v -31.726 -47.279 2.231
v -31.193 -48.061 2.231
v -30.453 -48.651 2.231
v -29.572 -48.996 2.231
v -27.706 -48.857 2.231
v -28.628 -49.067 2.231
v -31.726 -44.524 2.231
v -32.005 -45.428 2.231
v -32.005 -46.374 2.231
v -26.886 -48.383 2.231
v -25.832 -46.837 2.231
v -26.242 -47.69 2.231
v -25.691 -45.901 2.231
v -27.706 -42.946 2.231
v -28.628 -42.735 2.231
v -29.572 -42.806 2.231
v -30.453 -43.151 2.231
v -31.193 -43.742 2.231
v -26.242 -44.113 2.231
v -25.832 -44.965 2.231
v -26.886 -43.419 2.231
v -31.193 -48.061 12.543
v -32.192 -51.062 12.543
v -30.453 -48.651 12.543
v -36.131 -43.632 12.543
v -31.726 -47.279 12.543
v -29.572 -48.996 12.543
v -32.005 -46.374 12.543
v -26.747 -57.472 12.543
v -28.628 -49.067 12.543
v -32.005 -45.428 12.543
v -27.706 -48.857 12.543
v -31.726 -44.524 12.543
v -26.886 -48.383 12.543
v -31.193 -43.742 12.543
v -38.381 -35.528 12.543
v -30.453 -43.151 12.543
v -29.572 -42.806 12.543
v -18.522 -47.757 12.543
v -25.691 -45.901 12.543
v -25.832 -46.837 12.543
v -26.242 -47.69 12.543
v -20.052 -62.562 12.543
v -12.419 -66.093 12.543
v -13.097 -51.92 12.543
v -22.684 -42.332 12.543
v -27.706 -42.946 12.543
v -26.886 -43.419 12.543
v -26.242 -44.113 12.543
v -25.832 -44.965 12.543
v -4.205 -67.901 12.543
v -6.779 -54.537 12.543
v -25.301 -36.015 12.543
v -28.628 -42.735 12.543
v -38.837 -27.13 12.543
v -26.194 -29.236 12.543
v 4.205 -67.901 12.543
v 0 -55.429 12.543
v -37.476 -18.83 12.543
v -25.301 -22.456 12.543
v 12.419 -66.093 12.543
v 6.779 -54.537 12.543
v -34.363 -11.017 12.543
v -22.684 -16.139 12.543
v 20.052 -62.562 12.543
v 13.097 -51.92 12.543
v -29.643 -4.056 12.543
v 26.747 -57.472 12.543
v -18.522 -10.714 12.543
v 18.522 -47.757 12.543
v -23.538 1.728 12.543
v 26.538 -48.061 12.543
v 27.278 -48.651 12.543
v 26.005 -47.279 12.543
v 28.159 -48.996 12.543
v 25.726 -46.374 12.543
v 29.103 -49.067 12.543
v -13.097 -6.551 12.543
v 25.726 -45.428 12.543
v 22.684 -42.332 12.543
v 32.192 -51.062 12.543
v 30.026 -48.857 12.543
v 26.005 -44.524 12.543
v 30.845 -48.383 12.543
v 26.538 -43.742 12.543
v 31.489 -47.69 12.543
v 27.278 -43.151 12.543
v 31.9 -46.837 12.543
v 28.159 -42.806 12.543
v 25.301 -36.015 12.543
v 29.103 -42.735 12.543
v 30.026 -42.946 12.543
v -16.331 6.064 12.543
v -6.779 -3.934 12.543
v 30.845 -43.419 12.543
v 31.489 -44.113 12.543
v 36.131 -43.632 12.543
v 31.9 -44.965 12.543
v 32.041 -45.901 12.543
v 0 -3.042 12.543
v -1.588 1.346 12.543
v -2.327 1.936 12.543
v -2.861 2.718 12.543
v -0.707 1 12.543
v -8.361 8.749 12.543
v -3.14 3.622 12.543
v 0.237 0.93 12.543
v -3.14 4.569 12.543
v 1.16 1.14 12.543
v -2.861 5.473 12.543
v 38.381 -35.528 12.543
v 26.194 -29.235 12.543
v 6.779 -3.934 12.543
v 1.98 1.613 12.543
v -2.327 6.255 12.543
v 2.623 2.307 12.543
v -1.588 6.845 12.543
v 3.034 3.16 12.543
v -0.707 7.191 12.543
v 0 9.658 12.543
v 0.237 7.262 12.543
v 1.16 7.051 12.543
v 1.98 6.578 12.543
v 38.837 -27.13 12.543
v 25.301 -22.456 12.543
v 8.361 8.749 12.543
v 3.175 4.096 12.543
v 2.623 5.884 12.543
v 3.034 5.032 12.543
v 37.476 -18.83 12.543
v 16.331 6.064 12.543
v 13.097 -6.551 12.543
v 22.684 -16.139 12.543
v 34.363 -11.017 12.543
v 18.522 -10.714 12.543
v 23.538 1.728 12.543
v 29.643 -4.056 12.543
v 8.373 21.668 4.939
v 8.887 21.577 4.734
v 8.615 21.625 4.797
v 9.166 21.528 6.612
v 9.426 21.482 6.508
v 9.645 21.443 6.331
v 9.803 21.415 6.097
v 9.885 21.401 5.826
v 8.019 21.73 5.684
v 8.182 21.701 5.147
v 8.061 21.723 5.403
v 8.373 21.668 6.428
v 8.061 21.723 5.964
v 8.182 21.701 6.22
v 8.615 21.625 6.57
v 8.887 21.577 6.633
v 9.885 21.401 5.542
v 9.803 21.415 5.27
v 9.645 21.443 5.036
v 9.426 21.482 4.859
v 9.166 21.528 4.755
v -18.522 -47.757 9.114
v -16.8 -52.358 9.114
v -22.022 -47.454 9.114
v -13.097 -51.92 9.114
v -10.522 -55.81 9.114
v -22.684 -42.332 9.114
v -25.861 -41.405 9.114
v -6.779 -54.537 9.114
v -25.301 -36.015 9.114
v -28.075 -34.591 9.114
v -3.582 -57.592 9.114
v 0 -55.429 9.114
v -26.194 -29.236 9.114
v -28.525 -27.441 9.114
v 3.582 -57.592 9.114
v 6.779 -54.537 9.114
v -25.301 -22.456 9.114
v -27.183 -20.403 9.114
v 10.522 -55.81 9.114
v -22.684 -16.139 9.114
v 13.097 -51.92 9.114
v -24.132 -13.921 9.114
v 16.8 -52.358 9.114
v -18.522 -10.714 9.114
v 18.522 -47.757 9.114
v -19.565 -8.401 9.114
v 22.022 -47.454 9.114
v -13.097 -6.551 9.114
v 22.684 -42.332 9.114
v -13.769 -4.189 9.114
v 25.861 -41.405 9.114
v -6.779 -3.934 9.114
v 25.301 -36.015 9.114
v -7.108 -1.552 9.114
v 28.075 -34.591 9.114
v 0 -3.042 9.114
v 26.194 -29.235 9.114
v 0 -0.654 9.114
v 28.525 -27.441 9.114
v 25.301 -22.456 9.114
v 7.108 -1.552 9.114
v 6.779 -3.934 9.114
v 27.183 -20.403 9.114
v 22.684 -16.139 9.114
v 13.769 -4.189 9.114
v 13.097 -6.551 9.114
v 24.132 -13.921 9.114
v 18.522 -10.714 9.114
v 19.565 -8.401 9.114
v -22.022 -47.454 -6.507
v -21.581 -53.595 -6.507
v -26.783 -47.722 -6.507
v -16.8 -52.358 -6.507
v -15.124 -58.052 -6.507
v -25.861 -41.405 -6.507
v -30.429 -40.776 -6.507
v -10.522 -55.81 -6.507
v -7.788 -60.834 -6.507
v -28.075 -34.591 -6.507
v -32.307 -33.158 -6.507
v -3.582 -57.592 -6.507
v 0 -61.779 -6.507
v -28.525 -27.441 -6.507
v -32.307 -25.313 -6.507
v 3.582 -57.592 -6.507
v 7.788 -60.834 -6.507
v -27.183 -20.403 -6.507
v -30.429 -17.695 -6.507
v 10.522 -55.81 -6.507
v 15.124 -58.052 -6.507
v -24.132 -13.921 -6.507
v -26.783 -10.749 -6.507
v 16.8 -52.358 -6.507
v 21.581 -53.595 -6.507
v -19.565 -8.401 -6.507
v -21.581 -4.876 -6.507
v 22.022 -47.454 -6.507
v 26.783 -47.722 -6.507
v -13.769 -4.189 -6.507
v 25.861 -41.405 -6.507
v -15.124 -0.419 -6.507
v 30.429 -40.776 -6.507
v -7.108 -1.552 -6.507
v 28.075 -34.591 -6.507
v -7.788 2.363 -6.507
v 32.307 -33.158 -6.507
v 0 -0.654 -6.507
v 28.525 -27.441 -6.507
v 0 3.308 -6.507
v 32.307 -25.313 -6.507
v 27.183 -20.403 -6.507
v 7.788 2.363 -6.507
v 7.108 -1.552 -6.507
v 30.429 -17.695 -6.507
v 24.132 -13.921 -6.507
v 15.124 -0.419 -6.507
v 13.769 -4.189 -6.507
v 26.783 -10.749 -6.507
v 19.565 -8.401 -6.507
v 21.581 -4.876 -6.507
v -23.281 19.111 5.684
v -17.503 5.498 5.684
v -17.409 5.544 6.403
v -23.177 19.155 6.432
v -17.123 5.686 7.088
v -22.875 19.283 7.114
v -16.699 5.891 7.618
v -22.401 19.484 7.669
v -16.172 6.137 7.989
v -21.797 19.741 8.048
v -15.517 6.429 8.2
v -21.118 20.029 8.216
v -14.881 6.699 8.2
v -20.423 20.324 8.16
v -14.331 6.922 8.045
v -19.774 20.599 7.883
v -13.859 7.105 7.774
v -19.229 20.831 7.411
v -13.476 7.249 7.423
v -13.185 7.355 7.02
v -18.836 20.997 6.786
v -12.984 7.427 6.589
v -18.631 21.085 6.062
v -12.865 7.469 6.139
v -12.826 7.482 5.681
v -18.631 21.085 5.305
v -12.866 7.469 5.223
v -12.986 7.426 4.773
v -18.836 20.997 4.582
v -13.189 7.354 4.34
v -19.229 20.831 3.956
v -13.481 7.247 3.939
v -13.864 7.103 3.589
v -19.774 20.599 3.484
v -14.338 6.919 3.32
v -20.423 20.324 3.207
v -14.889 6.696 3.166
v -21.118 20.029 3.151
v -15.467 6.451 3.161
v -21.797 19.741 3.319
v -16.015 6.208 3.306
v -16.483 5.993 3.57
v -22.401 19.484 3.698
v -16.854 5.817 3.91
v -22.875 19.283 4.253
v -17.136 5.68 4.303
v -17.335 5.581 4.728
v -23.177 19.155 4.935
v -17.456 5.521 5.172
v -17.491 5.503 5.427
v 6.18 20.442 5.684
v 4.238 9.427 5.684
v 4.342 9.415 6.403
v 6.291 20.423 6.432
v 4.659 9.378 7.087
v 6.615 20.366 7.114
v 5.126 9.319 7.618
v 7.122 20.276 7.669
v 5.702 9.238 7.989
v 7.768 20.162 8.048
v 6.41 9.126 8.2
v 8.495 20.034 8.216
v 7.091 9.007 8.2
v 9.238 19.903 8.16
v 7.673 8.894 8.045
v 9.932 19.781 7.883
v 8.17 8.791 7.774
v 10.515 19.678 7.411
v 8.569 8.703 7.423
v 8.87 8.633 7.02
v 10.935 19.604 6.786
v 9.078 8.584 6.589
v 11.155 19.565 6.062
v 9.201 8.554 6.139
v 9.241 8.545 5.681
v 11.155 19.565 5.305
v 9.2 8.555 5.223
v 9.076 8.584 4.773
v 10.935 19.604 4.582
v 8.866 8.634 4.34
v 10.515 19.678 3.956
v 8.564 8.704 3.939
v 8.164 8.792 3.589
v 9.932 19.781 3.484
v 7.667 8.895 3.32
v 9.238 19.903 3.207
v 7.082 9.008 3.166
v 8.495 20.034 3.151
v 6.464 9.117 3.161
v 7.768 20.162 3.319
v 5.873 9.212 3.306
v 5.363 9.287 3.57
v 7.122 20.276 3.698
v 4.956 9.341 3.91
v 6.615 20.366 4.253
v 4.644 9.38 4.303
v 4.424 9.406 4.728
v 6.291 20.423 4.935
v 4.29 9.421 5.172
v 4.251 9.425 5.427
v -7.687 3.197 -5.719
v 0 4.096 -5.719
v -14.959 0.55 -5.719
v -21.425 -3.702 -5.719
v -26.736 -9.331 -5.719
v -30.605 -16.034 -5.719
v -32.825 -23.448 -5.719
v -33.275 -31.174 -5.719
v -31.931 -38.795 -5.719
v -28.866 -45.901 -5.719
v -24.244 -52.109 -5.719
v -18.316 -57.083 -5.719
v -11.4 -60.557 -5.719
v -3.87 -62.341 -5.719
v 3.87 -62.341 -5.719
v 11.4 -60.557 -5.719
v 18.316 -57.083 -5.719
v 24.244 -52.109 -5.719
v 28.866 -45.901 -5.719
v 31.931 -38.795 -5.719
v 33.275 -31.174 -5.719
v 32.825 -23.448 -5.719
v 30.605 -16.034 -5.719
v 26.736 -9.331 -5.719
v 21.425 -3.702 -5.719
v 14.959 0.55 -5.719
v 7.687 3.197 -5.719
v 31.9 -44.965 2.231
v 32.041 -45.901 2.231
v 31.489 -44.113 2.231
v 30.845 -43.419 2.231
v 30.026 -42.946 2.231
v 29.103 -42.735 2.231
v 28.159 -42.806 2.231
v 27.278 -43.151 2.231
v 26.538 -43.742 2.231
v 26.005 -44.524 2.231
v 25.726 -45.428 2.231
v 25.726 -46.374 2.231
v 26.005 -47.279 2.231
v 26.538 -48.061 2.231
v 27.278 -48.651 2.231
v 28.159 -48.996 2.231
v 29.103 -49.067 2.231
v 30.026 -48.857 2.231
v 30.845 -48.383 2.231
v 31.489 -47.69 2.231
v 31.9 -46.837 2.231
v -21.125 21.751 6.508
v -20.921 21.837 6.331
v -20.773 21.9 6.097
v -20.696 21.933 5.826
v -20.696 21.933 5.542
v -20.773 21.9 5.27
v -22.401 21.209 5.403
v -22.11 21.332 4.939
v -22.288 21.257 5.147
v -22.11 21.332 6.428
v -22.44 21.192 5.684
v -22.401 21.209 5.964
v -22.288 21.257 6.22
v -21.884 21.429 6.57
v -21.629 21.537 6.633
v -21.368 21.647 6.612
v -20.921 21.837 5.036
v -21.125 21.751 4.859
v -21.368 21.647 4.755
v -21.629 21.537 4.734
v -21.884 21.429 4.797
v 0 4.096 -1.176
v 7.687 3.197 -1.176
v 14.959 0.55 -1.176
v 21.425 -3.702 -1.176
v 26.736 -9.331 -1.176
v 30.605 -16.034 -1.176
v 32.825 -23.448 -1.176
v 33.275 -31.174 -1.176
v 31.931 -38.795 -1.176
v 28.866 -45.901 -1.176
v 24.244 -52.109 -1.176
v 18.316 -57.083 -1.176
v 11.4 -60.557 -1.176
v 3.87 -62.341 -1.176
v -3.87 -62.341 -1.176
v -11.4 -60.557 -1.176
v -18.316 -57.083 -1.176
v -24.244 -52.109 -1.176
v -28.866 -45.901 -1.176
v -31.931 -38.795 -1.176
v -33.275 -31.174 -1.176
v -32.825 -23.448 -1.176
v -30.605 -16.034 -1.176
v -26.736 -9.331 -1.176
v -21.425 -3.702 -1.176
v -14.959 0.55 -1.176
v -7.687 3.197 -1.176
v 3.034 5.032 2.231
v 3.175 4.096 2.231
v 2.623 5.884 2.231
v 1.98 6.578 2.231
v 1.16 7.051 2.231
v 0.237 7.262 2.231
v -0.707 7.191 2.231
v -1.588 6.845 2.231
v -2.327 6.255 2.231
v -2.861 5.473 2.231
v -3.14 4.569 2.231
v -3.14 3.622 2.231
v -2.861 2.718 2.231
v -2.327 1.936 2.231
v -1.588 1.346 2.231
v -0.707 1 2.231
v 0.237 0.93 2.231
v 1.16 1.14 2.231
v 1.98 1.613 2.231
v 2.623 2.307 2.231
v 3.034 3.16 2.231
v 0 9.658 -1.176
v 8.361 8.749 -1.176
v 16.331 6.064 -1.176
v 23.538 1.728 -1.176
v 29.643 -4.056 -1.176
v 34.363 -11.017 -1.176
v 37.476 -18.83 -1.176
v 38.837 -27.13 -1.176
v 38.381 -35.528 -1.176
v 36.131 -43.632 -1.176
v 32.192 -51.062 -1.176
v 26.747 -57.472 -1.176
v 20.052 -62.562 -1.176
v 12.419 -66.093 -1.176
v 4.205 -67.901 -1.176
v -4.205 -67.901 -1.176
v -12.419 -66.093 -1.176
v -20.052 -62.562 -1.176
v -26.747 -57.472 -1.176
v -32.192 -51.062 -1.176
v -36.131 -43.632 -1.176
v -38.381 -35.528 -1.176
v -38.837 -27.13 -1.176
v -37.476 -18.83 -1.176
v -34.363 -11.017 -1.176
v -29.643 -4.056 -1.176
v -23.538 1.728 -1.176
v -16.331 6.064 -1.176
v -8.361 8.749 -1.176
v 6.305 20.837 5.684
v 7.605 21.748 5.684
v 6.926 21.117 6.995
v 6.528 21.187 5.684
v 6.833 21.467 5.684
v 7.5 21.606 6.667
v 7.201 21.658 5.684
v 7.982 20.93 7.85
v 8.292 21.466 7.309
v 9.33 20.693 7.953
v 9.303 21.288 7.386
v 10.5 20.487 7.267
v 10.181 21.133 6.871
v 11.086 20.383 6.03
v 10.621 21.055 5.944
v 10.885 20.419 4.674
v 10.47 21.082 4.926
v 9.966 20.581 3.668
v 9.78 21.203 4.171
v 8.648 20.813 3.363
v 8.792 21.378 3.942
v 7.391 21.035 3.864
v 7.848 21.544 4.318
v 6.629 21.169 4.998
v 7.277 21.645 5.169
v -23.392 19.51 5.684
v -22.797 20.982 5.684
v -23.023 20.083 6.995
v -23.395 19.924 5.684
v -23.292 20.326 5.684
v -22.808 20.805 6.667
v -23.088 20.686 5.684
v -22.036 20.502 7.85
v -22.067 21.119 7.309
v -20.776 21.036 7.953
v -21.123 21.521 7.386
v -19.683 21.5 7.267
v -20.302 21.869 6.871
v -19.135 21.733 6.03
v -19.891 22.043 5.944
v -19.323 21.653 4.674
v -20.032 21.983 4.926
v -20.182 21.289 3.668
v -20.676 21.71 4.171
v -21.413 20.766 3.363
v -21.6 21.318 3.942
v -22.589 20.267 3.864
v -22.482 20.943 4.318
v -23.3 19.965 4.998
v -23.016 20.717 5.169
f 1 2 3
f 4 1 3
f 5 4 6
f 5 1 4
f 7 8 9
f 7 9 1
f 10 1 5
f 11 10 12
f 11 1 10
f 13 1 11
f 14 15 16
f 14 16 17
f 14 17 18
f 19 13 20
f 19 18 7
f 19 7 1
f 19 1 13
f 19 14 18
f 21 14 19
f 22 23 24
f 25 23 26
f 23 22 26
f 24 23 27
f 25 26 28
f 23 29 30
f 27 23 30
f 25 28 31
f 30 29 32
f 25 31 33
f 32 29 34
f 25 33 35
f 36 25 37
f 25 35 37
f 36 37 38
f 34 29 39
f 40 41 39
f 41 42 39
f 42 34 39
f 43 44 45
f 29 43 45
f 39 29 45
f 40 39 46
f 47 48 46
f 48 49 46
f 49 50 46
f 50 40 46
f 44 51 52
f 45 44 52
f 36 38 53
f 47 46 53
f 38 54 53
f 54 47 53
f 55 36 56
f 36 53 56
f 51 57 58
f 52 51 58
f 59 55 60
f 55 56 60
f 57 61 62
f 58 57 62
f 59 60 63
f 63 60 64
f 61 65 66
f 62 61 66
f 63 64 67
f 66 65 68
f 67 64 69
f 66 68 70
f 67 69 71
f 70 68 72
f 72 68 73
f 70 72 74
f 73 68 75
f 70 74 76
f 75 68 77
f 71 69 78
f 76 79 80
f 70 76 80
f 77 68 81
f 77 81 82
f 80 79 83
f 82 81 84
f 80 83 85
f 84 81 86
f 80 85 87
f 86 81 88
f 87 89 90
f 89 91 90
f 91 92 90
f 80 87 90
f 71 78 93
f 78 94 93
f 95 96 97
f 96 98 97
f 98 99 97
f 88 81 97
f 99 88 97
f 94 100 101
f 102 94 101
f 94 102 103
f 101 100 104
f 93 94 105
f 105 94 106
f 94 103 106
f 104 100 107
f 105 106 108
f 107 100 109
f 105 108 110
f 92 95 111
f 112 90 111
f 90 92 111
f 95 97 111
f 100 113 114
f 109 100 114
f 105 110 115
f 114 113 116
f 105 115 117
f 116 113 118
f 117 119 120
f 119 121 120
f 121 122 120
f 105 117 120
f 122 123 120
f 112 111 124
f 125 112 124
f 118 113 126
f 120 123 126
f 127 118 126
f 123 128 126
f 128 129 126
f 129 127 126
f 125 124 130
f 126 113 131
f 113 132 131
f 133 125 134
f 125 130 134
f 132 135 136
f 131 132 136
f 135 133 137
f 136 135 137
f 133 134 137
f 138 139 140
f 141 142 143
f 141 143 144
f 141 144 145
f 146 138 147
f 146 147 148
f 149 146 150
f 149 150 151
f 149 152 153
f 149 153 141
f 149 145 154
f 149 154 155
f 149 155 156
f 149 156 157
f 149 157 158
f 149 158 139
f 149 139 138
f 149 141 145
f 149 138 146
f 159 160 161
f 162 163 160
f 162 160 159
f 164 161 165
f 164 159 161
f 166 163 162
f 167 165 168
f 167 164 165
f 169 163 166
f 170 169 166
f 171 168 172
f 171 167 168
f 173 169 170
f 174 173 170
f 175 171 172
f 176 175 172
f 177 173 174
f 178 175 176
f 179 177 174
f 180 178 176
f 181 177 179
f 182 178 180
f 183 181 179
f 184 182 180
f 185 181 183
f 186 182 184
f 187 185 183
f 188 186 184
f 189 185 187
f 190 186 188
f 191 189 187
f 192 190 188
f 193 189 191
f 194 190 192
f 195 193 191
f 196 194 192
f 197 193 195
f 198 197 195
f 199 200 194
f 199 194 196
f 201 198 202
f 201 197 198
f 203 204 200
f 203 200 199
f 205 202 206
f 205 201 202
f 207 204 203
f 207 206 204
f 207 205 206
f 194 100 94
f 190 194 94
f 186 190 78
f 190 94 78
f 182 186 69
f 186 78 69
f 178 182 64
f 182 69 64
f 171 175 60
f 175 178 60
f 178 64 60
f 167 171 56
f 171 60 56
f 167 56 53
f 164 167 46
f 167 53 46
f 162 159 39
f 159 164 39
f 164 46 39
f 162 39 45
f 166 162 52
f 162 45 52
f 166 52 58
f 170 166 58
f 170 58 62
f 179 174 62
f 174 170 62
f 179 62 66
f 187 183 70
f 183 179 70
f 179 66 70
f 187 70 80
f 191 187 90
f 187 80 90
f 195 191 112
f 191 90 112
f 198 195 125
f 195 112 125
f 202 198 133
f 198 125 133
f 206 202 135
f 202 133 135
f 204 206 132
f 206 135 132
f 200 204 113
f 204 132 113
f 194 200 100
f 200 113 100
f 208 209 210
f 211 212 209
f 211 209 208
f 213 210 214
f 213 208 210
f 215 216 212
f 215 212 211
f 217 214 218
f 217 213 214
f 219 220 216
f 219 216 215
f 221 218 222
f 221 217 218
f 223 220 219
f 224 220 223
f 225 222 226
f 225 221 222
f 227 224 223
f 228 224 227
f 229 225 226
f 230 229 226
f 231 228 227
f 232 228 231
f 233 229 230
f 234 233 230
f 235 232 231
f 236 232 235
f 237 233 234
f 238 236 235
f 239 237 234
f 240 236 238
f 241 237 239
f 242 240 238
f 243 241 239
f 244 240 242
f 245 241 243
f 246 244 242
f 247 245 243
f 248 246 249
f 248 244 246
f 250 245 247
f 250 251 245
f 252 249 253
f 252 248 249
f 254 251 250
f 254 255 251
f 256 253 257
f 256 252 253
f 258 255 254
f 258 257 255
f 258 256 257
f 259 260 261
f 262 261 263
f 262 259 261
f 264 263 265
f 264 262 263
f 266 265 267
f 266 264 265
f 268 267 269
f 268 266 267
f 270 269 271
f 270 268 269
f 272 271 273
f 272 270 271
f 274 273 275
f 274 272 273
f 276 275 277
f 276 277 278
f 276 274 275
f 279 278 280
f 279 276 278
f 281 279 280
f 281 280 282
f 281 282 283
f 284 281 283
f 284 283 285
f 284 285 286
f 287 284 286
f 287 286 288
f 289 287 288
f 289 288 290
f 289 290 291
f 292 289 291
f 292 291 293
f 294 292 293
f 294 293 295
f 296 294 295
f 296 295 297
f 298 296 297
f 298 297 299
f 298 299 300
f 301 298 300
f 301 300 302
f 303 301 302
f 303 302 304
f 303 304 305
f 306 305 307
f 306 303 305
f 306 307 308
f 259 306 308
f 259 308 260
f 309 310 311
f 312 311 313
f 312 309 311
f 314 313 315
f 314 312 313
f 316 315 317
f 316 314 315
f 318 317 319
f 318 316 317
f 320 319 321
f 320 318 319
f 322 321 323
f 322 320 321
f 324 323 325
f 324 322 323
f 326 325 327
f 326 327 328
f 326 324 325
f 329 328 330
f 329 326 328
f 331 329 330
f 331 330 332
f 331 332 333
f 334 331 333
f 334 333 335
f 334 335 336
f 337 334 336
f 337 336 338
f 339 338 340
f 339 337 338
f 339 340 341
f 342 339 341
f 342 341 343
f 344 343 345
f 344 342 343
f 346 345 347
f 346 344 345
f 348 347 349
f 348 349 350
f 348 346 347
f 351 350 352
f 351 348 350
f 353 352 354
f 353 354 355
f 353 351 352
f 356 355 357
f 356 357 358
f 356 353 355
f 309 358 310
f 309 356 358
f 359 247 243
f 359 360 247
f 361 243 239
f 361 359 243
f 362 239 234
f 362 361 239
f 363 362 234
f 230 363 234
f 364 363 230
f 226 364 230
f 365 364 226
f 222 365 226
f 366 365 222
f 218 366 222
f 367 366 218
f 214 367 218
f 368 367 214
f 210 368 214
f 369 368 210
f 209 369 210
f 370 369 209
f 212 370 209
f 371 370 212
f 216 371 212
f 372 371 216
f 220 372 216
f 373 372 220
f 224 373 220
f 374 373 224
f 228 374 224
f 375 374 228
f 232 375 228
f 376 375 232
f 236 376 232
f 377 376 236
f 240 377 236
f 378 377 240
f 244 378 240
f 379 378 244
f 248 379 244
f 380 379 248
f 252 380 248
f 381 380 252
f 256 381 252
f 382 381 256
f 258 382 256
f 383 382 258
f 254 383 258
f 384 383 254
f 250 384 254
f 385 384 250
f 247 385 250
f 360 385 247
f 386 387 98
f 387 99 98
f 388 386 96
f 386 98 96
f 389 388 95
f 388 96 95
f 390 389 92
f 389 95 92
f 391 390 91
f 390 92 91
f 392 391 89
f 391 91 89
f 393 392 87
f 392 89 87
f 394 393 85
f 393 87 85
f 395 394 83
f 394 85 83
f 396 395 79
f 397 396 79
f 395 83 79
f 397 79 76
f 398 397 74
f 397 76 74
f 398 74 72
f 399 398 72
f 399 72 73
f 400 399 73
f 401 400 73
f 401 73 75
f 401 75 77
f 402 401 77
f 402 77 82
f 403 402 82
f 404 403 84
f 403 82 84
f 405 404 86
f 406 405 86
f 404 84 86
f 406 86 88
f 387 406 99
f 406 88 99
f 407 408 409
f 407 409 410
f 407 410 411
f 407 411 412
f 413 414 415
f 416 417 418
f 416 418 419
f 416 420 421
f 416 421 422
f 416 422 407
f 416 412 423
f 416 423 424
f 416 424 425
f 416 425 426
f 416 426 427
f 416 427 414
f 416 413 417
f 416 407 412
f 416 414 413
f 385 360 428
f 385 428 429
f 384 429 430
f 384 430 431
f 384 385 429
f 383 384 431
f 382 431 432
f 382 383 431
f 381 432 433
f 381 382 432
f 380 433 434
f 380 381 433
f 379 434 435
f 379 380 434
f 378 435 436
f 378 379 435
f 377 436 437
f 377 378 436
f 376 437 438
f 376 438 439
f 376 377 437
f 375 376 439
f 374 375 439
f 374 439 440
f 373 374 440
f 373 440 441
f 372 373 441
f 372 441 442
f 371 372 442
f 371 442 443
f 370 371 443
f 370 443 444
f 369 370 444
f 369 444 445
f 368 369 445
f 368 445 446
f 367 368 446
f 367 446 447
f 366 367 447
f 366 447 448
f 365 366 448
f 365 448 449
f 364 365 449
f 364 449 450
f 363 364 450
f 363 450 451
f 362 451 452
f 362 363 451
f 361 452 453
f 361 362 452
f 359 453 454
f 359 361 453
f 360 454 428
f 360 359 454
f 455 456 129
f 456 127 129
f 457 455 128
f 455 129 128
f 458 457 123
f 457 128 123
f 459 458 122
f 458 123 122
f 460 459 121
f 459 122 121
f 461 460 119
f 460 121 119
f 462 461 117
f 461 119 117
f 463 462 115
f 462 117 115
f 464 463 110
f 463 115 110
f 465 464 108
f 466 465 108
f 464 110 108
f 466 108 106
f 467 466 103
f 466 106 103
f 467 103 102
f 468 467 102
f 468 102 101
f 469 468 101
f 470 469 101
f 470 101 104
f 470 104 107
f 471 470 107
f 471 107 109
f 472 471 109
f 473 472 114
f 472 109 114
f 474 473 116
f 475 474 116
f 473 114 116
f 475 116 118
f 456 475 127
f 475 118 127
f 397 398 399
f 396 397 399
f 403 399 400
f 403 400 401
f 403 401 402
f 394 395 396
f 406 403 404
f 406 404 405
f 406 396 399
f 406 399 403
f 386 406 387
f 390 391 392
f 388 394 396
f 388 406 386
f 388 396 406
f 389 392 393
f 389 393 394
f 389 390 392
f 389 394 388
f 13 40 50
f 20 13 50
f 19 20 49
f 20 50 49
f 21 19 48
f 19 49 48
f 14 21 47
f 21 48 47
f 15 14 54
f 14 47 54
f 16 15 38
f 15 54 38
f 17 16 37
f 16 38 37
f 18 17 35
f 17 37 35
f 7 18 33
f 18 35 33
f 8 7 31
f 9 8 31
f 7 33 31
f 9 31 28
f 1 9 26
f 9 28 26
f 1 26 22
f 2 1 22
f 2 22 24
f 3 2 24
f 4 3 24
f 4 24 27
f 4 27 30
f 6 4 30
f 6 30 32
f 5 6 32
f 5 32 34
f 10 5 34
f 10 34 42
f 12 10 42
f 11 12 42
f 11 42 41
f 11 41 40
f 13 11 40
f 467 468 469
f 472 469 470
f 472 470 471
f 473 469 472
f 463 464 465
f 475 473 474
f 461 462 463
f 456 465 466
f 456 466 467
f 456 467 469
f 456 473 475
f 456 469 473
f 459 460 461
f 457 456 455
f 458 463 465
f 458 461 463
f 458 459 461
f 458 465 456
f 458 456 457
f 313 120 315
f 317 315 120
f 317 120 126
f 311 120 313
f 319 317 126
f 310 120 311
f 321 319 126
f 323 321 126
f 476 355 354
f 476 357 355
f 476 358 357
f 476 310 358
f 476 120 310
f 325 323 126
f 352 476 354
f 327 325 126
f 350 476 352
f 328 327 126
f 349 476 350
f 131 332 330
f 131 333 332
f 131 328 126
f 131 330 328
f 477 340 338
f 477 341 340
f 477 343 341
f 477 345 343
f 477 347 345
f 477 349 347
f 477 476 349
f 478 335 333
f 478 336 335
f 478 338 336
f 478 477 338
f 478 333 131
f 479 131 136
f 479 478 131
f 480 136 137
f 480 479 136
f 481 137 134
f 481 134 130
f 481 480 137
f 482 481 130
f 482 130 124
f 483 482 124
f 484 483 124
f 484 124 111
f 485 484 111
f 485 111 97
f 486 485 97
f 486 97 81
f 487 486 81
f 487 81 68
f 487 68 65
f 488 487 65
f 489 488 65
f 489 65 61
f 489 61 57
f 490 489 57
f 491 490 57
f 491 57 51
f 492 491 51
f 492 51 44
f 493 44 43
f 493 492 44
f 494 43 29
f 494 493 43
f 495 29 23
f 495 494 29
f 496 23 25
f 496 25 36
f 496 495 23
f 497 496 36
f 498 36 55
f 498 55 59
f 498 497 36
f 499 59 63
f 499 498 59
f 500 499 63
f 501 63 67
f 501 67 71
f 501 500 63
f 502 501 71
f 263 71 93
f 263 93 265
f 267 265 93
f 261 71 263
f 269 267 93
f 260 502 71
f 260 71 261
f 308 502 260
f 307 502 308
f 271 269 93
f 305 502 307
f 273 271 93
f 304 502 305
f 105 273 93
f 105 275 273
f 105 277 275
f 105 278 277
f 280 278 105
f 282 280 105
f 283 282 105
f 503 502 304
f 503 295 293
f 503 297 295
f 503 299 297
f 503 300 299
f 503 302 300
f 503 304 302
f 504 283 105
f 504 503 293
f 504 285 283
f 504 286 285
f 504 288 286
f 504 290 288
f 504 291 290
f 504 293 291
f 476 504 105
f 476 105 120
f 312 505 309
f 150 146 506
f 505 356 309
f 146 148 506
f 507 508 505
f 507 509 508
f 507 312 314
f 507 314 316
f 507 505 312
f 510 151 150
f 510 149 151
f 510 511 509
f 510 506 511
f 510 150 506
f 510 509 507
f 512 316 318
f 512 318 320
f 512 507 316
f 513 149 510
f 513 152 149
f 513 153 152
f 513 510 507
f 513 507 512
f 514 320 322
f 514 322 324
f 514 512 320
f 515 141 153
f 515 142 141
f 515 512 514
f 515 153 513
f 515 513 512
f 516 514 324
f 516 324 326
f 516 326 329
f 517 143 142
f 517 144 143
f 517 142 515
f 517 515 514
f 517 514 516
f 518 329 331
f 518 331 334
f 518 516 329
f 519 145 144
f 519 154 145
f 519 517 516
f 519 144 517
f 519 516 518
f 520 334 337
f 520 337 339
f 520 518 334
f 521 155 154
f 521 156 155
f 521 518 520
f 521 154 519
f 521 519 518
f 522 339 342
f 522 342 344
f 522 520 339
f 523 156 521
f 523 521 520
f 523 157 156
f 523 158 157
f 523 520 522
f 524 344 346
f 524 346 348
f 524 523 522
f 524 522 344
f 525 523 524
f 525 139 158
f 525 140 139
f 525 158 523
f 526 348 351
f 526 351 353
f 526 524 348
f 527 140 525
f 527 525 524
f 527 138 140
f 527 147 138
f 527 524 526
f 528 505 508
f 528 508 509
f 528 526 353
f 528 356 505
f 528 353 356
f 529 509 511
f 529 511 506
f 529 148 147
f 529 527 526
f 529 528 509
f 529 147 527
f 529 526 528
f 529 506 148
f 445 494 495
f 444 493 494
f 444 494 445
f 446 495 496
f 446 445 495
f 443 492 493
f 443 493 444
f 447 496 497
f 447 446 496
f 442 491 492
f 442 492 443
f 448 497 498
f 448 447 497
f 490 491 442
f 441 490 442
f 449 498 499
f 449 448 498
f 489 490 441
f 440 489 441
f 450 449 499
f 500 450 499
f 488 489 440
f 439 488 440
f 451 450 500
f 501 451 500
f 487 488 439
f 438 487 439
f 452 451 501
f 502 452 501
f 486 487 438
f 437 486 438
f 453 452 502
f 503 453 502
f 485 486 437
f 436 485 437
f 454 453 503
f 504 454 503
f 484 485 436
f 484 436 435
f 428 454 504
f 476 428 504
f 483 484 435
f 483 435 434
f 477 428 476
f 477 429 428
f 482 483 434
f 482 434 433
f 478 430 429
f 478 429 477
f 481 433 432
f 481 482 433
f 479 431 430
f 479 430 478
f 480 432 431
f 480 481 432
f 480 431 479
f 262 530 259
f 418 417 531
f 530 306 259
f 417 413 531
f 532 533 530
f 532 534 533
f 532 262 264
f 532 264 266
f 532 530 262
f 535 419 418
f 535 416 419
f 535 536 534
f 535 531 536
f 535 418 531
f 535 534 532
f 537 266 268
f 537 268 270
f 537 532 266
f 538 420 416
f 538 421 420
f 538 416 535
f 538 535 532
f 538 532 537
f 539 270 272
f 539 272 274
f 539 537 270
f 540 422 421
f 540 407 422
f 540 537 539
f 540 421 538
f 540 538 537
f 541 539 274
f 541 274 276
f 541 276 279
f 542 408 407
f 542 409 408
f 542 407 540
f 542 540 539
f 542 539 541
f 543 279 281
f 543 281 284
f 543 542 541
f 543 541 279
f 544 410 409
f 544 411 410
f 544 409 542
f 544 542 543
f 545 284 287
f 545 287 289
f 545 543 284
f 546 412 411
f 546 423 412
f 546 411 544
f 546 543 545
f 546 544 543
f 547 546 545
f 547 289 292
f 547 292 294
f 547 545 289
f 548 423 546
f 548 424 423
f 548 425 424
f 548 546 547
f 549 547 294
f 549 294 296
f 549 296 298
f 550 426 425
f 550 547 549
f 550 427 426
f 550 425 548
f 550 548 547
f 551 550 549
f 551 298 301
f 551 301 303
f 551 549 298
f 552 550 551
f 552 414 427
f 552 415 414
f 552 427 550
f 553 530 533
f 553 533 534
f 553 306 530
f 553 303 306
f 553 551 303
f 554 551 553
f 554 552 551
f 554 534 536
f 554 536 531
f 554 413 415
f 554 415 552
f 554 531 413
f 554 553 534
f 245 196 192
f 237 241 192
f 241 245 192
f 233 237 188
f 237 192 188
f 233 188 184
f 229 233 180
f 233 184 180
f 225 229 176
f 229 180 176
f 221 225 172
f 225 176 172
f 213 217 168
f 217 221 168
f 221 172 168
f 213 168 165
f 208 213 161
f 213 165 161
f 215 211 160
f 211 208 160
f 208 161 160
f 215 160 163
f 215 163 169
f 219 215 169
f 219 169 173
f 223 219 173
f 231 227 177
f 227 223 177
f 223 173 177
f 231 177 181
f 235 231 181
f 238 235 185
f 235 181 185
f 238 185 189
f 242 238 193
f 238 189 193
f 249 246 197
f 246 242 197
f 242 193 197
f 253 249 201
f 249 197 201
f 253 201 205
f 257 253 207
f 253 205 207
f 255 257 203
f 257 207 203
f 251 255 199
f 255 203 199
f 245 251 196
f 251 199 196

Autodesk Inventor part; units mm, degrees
sketch "Sketch1" plane through (0, 0, 0) normal (1, 0, 0) x (0, 1, 0)
  line L0 (9.6583, 12.5432) -> (9.6583, -1.1759)
  line L1 (9.6583, -1.1759) -> (4.0957, -1.1759)
  line L2 (4.0957, -1.1759) -> (4.0957, -6.5068)
  line L3 (4.0957, -6.5068) -> (-0.6541, -6.5068)
  line L4 (-0.6541, -6.5068) -> (-0.6541, 9.1142)
  line L5 (-0.6541, 9.1142) -> (-3.0417, 9.1142)
  line L6 (-3.0417, 9.1142) -> (-3.0417, 12.5432)
  line L7 (-3.0417, 12.5432) -> (9.6583, 12.5432)
  line L8 (9.6583, 12.5432) -> (-29.2355, 12.5432) construction
  line L9 (-29.2355, 12.5432) -> (-29.2355, -33.1187) construction
  point P0 (0, 0)
  dimension "d0" = 12.7
  dimension "d1" = 19.05
  dimension "d2" = 5.5626
  dimension "d3" = 10.3124
  dimension "d4" = 3.429
  dimension "d5" = 38.8937
revolve "Revolution1" add sketch "Sketch1" angle 360 about axis through (0, -29.2355, 12.5432) along (0, 0, -1)
chamfer "Chamfer1" distance 0.7874 angle 45 1 edges at (0, -62.5666, -6.5068)
sketch "Sketch2" plane through (0, -29.2355, 12.5432) normal (0, 0, 1) x (1, 0, 0)
  circle A0 centre (0, 0) radius 38.8938 projected
  circle A1 centre (0, 0) radius 33.3312 projected
  circle A2 centre (0, 33.3312) radius 3.175
  circle A3 centre (-28.8656, -16.6656) radius 3.175
  circle A4 centre (28.8656, -16.6656) radius 3.175
  point P0 (0, 29.2355)
  dimension "d10" = 6.35
  dimension "d13" = 360
extrude "Extrusion1" cut sketch "Sketch2" against normal blind 10.3124 contours A2 A1 | A1 A2 | A4 A1 | A1 A4 | A3 A1 | A1 A3
ref_plane "Work Plane1" through (0, -29.2355, 5.6836) normal (0, 0, 1) x (1, 0, 0)
sketch "Sketch4" plane through (0, -29.2355, 5.6836) normal (0, 0, 1) x (1, 0, 0)
  line L0 (0, 0) -> (0, 62.7832) construction
  circle A0 centre (0, 0) radius 28.5814 projected
  line L1 (-11.1676, 26.3093) -> (-21.5633, 50.8)
  line L2 (4.9631, 28.1471) -> (8.9574, 50.8)
  point P0 (0, 29.2355)
  dimension "d21" = 23
  dimension "d22" = 10
  dimension "d23" = 50.8
  dimension "d24" = 50.8
ref_plane "Work Plane2" through (8.9574, 21.5645, 5.6836) normal (0.1736, 0.9848, 0) x (-0.9848, 0.1736, 0)
sketch "Sketch5" plane through (8.9574, 21.5645, 5.6836) normal (0.1736, 0.9848, 0) x (-0.9848, 0.1736, 0)
  circle A0 centre (0, 0) radius 2.54
  point P0 (5.0767, -5.6836)
  dimension "d25" = 5.08
extrude "Extrusion2" add sketch "Sketch5" against normal blind 20.6375
ref_plane "Work Plane3" through (-21.5633, 21.5645, 5.6836) normal (-0.3907, 0.9205, 0) x (-0.9205, -0.3907, 0)
sketch "Sketch7" plane through (-21.5633, 21.5645, 5.6836) normal (-0.3907, 0.9205, 0) x (-0.9205, -0.3907, 0)
  circle A0 centre (0, 0) radius 2.54
  point P0 (-11.4232, -5.6836)
  dimension "d28" = 5.08
extrude "Extrusion3" add sketch "Sketch7" against normal blind 20.6375
fillet "Fillet1" radius 1.5875 1 edges at (11.4588, 21.1235, 5.6836)
fillet "Fillet2" radius 1.5875 1 edges at (-19.2252, 22.557, 5.6836)
